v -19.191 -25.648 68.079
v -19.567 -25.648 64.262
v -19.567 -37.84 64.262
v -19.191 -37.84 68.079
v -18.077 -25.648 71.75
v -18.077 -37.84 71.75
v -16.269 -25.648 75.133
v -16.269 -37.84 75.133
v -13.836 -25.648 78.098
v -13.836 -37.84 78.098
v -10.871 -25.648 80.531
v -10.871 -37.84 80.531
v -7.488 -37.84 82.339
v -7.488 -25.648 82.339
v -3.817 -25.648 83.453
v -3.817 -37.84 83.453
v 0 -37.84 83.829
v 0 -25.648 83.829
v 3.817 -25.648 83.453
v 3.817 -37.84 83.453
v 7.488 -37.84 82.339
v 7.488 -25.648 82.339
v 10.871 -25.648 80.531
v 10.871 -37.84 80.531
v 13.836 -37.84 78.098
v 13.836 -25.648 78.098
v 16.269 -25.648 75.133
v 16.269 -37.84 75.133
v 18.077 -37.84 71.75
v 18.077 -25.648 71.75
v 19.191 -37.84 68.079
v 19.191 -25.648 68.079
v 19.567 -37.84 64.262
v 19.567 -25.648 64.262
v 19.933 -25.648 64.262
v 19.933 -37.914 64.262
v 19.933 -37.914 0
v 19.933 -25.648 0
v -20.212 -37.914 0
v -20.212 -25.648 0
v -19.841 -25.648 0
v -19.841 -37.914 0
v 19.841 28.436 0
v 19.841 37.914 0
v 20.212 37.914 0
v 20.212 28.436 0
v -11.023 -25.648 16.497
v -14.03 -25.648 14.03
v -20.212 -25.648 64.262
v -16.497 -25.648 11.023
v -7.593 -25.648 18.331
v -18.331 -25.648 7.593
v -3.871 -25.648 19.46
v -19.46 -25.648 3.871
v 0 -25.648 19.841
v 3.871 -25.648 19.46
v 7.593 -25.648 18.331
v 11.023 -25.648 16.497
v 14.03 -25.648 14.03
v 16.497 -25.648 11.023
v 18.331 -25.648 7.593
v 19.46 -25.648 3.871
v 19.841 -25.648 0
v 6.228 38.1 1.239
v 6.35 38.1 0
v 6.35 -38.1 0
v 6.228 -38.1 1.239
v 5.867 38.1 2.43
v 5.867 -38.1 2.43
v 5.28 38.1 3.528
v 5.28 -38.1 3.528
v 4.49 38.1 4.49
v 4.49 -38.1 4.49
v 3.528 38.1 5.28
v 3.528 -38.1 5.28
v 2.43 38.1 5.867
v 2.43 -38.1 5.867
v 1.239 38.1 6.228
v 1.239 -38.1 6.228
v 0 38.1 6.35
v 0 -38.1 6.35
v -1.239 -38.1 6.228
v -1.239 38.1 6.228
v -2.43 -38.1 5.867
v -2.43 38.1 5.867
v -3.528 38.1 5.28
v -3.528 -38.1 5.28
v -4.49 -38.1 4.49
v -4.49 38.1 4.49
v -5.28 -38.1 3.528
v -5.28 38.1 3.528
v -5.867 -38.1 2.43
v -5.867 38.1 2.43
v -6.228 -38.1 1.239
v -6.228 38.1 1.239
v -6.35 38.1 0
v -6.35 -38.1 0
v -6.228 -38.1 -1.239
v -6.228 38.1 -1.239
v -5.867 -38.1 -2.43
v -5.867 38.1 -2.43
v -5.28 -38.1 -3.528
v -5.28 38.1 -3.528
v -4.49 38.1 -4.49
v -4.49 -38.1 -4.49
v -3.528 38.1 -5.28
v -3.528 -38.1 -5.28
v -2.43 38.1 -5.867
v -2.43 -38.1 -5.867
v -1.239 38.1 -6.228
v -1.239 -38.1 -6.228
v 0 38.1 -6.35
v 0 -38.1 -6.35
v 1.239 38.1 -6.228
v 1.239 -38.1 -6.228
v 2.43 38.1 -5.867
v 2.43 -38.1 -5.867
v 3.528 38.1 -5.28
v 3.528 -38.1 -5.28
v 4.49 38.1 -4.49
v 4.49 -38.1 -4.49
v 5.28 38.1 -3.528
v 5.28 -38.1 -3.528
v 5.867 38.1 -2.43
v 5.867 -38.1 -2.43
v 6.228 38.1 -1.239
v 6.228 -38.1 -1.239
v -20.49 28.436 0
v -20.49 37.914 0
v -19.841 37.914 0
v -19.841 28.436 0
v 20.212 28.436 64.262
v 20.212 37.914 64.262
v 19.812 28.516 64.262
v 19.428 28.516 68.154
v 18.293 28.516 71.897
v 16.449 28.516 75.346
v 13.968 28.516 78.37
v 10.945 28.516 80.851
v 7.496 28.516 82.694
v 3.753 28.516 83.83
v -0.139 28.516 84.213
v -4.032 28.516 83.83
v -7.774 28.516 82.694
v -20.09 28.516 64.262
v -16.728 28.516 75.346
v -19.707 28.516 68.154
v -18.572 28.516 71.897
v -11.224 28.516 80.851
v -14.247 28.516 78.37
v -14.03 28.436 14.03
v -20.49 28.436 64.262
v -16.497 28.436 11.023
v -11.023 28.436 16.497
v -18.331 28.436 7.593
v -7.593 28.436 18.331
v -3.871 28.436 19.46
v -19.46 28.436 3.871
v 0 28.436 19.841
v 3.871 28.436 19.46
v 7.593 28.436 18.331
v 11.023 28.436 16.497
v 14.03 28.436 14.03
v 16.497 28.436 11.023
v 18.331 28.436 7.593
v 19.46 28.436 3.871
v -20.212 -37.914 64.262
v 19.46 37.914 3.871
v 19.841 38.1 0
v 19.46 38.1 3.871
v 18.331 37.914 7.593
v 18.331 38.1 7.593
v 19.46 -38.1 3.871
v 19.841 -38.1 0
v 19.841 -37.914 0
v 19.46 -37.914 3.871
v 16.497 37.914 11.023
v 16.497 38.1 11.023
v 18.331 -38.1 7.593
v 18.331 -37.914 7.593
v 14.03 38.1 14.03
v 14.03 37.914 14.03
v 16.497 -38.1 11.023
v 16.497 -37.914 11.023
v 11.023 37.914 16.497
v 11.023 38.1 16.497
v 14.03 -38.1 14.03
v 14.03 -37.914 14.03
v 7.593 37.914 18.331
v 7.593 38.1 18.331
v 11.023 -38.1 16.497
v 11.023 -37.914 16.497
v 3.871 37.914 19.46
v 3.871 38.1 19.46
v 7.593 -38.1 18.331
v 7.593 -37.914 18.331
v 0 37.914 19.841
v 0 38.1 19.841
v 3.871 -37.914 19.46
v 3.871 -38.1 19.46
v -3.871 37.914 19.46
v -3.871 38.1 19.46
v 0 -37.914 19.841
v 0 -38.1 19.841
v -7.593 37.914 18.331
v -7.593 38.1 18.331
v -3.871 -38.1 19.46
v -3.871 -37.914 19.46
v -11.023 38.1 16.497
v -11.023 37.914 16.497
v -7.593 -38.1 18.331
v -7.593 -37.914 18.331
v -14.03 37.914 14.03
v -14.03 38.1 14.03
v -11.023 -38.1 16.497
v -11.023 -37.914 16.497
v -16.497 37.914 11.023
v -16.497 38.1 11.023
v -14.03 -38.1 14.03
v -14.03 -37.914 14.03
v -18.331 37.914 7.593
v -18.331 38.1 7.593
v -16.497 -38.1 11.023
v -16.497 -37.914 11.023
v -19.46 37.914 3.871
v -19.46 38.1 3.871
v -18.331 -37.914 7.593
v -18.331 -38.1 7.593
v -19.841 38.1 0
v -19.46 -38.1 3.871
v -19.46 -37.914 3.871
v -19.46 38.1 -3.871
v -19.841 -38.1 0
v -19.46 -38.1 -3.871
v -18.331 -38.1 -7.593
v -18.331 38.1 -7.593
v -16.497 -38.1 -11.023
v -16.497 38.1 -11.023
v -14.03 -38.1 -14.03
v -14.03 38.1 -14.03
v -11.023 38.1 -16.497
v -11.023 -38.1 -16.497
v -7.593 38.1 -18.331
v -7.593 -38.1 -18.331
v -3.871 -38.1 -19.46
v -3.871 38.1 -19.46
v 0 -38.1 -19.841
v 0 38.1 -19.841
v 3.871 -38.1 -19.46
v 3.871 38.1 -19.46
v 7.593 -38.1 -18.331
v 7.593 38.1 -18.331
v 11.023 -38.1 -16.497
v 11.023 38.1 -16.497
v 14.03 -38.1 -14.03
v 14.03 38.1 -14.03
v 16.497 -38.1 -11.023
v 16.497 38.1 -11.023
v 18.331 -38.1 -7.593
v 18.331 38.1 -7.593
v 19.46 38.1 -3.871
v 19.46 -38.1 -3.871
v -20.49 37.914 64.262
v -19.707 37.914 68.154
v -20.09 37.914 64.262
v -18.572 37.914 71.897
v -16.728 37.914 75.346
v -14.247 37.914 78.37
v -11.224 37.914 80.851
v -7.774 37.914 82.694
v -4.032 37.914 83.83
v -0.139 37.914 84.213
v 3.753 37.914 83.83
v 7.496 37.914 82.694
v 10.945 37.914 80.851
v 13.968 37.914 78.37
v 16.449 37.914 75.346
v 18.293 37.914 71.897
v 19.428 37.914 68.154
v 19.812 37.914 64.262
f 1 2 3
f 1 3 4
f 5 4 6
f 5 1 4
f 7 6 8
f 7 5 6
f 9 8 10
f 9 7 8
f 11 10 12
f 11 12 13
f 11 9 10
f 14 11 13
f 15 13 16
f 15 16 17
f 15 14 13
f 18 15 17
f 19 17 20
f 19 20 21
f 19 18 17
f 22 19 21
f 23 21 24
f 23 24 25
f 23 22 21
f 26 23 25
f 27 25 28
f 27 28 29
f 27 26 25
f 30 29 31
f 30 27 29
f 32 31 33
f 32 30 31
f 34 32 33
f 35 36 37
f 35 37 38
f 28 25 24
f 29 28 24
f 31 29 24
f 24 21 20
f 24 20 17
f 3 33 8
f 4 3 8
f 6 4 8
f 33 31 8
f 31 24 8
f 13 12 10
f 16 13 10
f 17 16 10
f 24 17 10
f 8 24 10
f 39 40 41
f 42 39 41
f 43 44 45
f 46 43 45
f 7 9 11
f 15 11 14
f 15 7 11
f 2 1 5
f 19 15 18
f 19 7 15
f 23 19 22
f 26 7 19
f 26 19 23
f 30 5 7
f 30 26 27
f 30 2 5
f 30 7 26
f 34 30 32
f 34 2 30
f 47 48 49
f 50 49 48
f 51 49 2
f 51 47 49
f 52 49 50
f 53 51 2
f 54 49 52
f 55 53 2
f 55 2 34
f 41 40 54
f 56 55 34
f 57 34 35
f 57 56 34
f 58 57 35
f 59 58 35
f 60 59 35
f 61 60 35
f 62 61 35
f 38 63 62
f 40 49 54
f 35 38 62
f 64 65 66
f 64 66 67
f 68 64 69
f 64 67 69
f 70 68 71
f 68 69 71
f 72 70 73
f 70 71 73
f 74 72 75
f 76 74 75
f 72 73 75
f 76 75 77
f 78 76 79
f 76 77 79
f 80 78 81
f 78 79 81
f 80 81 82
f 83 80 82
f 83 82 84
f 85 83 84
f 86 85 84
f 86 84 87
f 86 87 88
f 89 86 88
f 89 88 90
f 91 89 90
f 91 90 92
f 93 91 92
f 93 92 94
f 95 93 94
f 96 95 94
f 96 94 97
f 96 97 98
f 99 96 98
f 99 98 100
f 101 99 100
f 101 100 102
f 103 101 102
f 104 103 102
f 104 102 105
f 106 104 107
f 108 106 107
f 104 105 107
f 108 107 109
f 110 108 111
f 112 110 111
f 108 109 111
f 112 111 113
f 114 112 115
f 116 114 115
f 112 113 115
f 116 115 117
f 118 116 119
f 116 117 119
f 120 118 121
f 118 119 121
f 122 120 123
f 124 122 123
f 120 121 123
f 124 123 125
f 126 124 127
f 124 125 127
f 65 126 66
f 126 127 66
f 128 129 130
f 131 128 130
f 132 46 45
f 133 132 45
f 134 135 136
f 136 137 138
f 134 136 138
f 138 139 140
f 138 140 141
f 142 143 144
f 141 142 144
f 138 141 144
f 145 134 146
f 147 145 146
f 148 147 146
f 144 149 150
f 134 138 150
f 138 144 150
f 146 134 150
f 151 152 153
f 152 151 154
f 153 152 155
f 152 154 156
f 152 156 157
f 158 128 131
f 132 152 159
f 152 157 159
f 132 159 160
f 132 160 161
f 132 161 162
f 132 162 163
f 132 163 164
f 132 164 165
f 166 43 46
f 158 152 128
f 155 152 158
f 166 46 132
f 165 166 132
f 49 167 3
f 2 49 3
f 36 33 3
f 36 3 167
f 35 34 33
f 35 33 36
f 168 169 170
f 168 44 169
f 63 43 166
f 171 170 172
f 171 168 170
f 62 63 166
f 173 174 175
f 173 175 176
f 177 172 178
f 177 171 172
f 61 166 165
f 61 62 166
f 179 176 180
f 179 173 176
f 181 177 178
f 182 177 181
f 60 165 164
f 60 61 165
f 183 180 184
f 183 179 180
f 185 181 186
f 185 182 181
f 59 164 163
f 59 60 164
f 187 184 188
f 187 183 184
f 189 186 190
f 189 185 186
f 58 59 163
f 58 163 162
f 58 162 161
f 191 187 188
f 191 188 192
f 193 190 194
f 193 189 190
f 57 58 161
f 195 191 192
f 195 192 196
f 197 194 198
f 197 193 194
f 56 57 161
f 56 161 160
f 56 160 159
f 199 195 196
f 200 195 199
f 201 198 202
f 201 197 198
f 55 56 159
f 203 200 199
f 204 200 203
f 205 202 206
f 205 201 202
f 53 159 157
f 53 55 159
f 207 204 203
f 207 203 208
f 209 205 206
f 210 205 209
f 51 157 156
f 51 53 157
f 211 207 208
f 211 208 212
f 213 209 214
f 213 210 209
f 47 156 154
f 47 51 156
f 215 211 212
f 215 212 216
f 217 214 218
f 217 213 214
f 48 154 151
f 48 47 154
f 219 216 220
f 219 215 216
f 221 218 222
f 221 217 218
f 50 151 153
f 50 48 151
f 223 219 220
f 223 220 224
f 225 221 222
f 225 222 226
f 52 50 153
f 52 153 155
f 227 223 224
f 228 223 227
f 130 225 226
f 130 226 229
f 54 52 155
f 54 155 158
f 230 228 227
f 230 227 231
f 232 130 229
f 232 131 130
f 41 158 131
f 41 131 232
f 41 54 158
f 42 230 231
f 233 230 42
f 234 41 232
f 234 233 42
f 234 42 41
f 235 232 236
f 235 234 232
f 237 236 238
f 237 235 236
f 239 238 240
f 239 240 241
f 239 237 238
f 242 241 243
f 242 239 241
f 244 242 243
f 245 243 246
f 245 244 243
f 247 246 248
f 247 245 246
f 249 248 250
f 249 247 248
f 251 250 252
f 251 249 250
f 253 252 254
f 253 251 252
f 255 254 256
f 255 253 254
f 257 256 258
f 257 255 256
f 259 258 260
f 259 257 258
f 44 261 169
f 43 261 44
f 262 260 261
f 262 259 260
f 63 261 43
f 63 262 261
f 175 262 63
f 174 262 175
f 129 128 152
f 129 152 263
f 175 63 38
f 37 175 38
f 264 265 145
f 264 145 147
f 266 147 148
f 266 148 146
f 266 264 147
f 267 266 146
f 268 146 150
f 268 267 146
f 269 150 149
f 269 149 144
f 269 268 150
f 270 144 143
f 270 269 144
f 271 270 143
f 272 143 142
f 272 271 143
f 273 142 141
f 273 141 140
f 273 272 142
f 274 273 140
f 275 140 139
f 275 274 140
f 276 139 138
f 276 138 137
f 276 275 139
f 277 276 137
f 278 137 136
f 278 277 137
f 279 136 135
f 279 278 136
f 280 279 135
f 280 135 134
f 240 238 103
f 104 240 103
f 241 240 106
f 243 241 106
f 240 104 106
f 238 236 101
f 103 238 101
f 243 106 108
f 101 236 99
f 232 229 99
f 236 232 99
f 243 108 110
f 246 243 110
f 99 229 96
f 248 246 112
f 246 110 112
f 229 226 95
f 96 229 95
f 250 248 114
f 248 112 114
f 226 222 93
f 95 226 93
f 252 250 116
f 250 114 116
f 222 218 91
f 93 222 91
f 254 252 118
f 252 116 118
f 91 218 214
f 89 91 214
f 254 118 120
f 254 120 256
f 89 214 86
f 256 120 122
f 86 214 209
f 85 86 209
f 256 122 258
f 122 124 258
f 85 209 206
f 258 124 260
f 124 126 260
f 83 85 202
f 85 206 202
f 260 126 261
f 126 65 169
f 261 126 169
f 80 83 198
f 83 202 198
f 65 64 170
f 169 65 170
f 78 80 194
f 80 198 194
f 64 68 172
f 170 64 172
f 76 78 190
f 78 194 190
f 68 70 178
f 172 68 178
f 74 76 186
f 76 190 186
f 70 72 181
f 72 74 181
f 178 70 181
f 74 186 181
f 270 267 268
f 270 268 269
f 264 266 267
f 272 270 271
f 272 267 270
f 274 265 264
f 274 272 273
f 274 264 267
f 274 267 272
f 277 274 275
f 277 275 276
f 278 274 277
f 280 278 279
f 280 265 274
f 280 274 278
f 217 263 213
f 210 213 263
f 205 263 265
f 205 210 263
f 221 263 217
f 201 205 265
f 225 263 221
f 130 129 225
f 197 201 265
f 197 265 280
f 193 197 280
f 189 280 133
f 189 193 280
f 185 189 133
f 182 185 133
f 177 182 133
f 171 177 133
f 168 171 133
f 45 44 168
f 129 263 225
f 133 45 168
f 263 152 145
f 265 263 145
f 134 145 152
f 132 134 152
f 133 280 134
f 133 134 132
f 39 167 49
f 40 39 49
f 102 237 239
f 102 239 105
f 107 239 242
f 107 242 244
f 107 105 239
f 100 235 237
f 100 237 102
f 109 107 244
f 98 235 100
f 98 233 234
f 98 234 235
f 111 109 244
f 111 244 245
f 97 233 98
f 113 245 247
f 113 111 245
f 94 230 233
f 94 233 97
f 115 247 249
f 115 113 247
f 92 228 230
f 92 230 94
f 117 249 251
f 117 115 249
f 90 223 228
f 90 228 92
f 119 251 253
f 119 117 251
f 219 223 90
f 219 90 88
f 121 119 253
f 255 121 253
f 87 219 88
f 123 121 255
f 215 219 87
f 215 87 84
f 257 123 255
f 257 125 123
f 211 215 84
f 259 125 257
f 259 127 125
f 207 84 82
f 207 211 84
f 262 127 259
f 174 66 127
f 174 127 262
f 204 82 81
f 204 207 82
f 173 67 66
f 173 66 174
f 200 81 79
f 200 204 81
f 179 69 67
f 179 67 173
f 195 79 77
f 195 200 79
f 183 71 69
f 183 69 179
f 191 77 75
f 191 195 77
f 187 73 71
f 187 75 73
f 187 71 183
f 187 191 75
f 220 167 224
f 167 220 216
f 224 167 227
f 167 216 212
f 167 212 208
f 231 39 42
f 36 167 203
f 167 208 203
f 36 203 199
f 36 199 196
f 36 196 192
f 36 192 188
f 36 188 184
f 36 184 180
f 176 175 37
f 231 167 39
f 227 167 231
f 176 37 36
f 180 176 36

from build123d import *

# Parameters (mm, degrees)
F0_R      = 19.8409660839
F1_DEPTH  = 38.1
F3_W      = 40.1443894953
F3_H      = 12.2663397342
F4_DEPTH  = 64.262
F5_W      = 40.7019536942
F5_H      = 9.4785336405
F6_DEPTH  = 64.262
F7_D      = 12.7
F9_DEPTH  = 12.192
F11_DEPTH = 9.398


with BuildPart() as f1:
    # F0 (on Front) → F1 (new body, symmetric)
    with BuildSketch(Plane.XZ):
        Circle(F0_R)
    extrude(amount=F1_DEPTH, both=True)

    # F3 (on Top) → F4 (join)
    with BuildSketch(Plane.XY):
        with Locations((-0.1393901184, -31.7809758708)):
            Rectangle(F3_W, F3_H)
    extrude(amount=F4_DEPTH)

    # F5 (on Top) → F6 (join)
    with BuildSketch(Plane.XY):
        with Locations((-0.1393901184, 33.1748789176)):
            Rectangle(F5_W, F5_H)
    extrude(amount=F6_DEPTH)

    # F7 (through all)
    with Locations(Plane(origin=(0, 38.1, 0), x_dir=(-1, 0, 0), z_dir=(0, 1, 0))):
        with Locations((0, 0)):
            Hole(F7_D / 2)

    # F8 (on face) → F9 (join)
    with BuildSketch(Plane(origin=(0, -25.6478060037, 0), x_dir=(-1, 0, 0), z_dir=(0, 1, 0))):
        with BuildLine():
            Line((-19.566863193, 64.262), (19.566863193, 64.262))
            ThreePointArc((19.566863193, 64.262), (0, 83.828863193), (-19.566863193, 64.262))
        make_face()
    extrude(amount=-F9_DEPTH)

    # F10 (on face) → F11 (join)
    with BuildSketch(Plane(origin=(0, 37.9141457379, 0), x_dir=(-1, 0, 0), z_dir=(0, 1, 0))):
        with BuildLine():
            Line((-19.8116342985, 64.262), (20.0904145353, 64.262))
            ThreePointArc((20.0904145353, 64.262), (0.1393901184, 84.2130244169), (-19.8116342985, 64.262))
        make_face()
    extrude(amount=-F11_DEPTH)


solid = f1.part
